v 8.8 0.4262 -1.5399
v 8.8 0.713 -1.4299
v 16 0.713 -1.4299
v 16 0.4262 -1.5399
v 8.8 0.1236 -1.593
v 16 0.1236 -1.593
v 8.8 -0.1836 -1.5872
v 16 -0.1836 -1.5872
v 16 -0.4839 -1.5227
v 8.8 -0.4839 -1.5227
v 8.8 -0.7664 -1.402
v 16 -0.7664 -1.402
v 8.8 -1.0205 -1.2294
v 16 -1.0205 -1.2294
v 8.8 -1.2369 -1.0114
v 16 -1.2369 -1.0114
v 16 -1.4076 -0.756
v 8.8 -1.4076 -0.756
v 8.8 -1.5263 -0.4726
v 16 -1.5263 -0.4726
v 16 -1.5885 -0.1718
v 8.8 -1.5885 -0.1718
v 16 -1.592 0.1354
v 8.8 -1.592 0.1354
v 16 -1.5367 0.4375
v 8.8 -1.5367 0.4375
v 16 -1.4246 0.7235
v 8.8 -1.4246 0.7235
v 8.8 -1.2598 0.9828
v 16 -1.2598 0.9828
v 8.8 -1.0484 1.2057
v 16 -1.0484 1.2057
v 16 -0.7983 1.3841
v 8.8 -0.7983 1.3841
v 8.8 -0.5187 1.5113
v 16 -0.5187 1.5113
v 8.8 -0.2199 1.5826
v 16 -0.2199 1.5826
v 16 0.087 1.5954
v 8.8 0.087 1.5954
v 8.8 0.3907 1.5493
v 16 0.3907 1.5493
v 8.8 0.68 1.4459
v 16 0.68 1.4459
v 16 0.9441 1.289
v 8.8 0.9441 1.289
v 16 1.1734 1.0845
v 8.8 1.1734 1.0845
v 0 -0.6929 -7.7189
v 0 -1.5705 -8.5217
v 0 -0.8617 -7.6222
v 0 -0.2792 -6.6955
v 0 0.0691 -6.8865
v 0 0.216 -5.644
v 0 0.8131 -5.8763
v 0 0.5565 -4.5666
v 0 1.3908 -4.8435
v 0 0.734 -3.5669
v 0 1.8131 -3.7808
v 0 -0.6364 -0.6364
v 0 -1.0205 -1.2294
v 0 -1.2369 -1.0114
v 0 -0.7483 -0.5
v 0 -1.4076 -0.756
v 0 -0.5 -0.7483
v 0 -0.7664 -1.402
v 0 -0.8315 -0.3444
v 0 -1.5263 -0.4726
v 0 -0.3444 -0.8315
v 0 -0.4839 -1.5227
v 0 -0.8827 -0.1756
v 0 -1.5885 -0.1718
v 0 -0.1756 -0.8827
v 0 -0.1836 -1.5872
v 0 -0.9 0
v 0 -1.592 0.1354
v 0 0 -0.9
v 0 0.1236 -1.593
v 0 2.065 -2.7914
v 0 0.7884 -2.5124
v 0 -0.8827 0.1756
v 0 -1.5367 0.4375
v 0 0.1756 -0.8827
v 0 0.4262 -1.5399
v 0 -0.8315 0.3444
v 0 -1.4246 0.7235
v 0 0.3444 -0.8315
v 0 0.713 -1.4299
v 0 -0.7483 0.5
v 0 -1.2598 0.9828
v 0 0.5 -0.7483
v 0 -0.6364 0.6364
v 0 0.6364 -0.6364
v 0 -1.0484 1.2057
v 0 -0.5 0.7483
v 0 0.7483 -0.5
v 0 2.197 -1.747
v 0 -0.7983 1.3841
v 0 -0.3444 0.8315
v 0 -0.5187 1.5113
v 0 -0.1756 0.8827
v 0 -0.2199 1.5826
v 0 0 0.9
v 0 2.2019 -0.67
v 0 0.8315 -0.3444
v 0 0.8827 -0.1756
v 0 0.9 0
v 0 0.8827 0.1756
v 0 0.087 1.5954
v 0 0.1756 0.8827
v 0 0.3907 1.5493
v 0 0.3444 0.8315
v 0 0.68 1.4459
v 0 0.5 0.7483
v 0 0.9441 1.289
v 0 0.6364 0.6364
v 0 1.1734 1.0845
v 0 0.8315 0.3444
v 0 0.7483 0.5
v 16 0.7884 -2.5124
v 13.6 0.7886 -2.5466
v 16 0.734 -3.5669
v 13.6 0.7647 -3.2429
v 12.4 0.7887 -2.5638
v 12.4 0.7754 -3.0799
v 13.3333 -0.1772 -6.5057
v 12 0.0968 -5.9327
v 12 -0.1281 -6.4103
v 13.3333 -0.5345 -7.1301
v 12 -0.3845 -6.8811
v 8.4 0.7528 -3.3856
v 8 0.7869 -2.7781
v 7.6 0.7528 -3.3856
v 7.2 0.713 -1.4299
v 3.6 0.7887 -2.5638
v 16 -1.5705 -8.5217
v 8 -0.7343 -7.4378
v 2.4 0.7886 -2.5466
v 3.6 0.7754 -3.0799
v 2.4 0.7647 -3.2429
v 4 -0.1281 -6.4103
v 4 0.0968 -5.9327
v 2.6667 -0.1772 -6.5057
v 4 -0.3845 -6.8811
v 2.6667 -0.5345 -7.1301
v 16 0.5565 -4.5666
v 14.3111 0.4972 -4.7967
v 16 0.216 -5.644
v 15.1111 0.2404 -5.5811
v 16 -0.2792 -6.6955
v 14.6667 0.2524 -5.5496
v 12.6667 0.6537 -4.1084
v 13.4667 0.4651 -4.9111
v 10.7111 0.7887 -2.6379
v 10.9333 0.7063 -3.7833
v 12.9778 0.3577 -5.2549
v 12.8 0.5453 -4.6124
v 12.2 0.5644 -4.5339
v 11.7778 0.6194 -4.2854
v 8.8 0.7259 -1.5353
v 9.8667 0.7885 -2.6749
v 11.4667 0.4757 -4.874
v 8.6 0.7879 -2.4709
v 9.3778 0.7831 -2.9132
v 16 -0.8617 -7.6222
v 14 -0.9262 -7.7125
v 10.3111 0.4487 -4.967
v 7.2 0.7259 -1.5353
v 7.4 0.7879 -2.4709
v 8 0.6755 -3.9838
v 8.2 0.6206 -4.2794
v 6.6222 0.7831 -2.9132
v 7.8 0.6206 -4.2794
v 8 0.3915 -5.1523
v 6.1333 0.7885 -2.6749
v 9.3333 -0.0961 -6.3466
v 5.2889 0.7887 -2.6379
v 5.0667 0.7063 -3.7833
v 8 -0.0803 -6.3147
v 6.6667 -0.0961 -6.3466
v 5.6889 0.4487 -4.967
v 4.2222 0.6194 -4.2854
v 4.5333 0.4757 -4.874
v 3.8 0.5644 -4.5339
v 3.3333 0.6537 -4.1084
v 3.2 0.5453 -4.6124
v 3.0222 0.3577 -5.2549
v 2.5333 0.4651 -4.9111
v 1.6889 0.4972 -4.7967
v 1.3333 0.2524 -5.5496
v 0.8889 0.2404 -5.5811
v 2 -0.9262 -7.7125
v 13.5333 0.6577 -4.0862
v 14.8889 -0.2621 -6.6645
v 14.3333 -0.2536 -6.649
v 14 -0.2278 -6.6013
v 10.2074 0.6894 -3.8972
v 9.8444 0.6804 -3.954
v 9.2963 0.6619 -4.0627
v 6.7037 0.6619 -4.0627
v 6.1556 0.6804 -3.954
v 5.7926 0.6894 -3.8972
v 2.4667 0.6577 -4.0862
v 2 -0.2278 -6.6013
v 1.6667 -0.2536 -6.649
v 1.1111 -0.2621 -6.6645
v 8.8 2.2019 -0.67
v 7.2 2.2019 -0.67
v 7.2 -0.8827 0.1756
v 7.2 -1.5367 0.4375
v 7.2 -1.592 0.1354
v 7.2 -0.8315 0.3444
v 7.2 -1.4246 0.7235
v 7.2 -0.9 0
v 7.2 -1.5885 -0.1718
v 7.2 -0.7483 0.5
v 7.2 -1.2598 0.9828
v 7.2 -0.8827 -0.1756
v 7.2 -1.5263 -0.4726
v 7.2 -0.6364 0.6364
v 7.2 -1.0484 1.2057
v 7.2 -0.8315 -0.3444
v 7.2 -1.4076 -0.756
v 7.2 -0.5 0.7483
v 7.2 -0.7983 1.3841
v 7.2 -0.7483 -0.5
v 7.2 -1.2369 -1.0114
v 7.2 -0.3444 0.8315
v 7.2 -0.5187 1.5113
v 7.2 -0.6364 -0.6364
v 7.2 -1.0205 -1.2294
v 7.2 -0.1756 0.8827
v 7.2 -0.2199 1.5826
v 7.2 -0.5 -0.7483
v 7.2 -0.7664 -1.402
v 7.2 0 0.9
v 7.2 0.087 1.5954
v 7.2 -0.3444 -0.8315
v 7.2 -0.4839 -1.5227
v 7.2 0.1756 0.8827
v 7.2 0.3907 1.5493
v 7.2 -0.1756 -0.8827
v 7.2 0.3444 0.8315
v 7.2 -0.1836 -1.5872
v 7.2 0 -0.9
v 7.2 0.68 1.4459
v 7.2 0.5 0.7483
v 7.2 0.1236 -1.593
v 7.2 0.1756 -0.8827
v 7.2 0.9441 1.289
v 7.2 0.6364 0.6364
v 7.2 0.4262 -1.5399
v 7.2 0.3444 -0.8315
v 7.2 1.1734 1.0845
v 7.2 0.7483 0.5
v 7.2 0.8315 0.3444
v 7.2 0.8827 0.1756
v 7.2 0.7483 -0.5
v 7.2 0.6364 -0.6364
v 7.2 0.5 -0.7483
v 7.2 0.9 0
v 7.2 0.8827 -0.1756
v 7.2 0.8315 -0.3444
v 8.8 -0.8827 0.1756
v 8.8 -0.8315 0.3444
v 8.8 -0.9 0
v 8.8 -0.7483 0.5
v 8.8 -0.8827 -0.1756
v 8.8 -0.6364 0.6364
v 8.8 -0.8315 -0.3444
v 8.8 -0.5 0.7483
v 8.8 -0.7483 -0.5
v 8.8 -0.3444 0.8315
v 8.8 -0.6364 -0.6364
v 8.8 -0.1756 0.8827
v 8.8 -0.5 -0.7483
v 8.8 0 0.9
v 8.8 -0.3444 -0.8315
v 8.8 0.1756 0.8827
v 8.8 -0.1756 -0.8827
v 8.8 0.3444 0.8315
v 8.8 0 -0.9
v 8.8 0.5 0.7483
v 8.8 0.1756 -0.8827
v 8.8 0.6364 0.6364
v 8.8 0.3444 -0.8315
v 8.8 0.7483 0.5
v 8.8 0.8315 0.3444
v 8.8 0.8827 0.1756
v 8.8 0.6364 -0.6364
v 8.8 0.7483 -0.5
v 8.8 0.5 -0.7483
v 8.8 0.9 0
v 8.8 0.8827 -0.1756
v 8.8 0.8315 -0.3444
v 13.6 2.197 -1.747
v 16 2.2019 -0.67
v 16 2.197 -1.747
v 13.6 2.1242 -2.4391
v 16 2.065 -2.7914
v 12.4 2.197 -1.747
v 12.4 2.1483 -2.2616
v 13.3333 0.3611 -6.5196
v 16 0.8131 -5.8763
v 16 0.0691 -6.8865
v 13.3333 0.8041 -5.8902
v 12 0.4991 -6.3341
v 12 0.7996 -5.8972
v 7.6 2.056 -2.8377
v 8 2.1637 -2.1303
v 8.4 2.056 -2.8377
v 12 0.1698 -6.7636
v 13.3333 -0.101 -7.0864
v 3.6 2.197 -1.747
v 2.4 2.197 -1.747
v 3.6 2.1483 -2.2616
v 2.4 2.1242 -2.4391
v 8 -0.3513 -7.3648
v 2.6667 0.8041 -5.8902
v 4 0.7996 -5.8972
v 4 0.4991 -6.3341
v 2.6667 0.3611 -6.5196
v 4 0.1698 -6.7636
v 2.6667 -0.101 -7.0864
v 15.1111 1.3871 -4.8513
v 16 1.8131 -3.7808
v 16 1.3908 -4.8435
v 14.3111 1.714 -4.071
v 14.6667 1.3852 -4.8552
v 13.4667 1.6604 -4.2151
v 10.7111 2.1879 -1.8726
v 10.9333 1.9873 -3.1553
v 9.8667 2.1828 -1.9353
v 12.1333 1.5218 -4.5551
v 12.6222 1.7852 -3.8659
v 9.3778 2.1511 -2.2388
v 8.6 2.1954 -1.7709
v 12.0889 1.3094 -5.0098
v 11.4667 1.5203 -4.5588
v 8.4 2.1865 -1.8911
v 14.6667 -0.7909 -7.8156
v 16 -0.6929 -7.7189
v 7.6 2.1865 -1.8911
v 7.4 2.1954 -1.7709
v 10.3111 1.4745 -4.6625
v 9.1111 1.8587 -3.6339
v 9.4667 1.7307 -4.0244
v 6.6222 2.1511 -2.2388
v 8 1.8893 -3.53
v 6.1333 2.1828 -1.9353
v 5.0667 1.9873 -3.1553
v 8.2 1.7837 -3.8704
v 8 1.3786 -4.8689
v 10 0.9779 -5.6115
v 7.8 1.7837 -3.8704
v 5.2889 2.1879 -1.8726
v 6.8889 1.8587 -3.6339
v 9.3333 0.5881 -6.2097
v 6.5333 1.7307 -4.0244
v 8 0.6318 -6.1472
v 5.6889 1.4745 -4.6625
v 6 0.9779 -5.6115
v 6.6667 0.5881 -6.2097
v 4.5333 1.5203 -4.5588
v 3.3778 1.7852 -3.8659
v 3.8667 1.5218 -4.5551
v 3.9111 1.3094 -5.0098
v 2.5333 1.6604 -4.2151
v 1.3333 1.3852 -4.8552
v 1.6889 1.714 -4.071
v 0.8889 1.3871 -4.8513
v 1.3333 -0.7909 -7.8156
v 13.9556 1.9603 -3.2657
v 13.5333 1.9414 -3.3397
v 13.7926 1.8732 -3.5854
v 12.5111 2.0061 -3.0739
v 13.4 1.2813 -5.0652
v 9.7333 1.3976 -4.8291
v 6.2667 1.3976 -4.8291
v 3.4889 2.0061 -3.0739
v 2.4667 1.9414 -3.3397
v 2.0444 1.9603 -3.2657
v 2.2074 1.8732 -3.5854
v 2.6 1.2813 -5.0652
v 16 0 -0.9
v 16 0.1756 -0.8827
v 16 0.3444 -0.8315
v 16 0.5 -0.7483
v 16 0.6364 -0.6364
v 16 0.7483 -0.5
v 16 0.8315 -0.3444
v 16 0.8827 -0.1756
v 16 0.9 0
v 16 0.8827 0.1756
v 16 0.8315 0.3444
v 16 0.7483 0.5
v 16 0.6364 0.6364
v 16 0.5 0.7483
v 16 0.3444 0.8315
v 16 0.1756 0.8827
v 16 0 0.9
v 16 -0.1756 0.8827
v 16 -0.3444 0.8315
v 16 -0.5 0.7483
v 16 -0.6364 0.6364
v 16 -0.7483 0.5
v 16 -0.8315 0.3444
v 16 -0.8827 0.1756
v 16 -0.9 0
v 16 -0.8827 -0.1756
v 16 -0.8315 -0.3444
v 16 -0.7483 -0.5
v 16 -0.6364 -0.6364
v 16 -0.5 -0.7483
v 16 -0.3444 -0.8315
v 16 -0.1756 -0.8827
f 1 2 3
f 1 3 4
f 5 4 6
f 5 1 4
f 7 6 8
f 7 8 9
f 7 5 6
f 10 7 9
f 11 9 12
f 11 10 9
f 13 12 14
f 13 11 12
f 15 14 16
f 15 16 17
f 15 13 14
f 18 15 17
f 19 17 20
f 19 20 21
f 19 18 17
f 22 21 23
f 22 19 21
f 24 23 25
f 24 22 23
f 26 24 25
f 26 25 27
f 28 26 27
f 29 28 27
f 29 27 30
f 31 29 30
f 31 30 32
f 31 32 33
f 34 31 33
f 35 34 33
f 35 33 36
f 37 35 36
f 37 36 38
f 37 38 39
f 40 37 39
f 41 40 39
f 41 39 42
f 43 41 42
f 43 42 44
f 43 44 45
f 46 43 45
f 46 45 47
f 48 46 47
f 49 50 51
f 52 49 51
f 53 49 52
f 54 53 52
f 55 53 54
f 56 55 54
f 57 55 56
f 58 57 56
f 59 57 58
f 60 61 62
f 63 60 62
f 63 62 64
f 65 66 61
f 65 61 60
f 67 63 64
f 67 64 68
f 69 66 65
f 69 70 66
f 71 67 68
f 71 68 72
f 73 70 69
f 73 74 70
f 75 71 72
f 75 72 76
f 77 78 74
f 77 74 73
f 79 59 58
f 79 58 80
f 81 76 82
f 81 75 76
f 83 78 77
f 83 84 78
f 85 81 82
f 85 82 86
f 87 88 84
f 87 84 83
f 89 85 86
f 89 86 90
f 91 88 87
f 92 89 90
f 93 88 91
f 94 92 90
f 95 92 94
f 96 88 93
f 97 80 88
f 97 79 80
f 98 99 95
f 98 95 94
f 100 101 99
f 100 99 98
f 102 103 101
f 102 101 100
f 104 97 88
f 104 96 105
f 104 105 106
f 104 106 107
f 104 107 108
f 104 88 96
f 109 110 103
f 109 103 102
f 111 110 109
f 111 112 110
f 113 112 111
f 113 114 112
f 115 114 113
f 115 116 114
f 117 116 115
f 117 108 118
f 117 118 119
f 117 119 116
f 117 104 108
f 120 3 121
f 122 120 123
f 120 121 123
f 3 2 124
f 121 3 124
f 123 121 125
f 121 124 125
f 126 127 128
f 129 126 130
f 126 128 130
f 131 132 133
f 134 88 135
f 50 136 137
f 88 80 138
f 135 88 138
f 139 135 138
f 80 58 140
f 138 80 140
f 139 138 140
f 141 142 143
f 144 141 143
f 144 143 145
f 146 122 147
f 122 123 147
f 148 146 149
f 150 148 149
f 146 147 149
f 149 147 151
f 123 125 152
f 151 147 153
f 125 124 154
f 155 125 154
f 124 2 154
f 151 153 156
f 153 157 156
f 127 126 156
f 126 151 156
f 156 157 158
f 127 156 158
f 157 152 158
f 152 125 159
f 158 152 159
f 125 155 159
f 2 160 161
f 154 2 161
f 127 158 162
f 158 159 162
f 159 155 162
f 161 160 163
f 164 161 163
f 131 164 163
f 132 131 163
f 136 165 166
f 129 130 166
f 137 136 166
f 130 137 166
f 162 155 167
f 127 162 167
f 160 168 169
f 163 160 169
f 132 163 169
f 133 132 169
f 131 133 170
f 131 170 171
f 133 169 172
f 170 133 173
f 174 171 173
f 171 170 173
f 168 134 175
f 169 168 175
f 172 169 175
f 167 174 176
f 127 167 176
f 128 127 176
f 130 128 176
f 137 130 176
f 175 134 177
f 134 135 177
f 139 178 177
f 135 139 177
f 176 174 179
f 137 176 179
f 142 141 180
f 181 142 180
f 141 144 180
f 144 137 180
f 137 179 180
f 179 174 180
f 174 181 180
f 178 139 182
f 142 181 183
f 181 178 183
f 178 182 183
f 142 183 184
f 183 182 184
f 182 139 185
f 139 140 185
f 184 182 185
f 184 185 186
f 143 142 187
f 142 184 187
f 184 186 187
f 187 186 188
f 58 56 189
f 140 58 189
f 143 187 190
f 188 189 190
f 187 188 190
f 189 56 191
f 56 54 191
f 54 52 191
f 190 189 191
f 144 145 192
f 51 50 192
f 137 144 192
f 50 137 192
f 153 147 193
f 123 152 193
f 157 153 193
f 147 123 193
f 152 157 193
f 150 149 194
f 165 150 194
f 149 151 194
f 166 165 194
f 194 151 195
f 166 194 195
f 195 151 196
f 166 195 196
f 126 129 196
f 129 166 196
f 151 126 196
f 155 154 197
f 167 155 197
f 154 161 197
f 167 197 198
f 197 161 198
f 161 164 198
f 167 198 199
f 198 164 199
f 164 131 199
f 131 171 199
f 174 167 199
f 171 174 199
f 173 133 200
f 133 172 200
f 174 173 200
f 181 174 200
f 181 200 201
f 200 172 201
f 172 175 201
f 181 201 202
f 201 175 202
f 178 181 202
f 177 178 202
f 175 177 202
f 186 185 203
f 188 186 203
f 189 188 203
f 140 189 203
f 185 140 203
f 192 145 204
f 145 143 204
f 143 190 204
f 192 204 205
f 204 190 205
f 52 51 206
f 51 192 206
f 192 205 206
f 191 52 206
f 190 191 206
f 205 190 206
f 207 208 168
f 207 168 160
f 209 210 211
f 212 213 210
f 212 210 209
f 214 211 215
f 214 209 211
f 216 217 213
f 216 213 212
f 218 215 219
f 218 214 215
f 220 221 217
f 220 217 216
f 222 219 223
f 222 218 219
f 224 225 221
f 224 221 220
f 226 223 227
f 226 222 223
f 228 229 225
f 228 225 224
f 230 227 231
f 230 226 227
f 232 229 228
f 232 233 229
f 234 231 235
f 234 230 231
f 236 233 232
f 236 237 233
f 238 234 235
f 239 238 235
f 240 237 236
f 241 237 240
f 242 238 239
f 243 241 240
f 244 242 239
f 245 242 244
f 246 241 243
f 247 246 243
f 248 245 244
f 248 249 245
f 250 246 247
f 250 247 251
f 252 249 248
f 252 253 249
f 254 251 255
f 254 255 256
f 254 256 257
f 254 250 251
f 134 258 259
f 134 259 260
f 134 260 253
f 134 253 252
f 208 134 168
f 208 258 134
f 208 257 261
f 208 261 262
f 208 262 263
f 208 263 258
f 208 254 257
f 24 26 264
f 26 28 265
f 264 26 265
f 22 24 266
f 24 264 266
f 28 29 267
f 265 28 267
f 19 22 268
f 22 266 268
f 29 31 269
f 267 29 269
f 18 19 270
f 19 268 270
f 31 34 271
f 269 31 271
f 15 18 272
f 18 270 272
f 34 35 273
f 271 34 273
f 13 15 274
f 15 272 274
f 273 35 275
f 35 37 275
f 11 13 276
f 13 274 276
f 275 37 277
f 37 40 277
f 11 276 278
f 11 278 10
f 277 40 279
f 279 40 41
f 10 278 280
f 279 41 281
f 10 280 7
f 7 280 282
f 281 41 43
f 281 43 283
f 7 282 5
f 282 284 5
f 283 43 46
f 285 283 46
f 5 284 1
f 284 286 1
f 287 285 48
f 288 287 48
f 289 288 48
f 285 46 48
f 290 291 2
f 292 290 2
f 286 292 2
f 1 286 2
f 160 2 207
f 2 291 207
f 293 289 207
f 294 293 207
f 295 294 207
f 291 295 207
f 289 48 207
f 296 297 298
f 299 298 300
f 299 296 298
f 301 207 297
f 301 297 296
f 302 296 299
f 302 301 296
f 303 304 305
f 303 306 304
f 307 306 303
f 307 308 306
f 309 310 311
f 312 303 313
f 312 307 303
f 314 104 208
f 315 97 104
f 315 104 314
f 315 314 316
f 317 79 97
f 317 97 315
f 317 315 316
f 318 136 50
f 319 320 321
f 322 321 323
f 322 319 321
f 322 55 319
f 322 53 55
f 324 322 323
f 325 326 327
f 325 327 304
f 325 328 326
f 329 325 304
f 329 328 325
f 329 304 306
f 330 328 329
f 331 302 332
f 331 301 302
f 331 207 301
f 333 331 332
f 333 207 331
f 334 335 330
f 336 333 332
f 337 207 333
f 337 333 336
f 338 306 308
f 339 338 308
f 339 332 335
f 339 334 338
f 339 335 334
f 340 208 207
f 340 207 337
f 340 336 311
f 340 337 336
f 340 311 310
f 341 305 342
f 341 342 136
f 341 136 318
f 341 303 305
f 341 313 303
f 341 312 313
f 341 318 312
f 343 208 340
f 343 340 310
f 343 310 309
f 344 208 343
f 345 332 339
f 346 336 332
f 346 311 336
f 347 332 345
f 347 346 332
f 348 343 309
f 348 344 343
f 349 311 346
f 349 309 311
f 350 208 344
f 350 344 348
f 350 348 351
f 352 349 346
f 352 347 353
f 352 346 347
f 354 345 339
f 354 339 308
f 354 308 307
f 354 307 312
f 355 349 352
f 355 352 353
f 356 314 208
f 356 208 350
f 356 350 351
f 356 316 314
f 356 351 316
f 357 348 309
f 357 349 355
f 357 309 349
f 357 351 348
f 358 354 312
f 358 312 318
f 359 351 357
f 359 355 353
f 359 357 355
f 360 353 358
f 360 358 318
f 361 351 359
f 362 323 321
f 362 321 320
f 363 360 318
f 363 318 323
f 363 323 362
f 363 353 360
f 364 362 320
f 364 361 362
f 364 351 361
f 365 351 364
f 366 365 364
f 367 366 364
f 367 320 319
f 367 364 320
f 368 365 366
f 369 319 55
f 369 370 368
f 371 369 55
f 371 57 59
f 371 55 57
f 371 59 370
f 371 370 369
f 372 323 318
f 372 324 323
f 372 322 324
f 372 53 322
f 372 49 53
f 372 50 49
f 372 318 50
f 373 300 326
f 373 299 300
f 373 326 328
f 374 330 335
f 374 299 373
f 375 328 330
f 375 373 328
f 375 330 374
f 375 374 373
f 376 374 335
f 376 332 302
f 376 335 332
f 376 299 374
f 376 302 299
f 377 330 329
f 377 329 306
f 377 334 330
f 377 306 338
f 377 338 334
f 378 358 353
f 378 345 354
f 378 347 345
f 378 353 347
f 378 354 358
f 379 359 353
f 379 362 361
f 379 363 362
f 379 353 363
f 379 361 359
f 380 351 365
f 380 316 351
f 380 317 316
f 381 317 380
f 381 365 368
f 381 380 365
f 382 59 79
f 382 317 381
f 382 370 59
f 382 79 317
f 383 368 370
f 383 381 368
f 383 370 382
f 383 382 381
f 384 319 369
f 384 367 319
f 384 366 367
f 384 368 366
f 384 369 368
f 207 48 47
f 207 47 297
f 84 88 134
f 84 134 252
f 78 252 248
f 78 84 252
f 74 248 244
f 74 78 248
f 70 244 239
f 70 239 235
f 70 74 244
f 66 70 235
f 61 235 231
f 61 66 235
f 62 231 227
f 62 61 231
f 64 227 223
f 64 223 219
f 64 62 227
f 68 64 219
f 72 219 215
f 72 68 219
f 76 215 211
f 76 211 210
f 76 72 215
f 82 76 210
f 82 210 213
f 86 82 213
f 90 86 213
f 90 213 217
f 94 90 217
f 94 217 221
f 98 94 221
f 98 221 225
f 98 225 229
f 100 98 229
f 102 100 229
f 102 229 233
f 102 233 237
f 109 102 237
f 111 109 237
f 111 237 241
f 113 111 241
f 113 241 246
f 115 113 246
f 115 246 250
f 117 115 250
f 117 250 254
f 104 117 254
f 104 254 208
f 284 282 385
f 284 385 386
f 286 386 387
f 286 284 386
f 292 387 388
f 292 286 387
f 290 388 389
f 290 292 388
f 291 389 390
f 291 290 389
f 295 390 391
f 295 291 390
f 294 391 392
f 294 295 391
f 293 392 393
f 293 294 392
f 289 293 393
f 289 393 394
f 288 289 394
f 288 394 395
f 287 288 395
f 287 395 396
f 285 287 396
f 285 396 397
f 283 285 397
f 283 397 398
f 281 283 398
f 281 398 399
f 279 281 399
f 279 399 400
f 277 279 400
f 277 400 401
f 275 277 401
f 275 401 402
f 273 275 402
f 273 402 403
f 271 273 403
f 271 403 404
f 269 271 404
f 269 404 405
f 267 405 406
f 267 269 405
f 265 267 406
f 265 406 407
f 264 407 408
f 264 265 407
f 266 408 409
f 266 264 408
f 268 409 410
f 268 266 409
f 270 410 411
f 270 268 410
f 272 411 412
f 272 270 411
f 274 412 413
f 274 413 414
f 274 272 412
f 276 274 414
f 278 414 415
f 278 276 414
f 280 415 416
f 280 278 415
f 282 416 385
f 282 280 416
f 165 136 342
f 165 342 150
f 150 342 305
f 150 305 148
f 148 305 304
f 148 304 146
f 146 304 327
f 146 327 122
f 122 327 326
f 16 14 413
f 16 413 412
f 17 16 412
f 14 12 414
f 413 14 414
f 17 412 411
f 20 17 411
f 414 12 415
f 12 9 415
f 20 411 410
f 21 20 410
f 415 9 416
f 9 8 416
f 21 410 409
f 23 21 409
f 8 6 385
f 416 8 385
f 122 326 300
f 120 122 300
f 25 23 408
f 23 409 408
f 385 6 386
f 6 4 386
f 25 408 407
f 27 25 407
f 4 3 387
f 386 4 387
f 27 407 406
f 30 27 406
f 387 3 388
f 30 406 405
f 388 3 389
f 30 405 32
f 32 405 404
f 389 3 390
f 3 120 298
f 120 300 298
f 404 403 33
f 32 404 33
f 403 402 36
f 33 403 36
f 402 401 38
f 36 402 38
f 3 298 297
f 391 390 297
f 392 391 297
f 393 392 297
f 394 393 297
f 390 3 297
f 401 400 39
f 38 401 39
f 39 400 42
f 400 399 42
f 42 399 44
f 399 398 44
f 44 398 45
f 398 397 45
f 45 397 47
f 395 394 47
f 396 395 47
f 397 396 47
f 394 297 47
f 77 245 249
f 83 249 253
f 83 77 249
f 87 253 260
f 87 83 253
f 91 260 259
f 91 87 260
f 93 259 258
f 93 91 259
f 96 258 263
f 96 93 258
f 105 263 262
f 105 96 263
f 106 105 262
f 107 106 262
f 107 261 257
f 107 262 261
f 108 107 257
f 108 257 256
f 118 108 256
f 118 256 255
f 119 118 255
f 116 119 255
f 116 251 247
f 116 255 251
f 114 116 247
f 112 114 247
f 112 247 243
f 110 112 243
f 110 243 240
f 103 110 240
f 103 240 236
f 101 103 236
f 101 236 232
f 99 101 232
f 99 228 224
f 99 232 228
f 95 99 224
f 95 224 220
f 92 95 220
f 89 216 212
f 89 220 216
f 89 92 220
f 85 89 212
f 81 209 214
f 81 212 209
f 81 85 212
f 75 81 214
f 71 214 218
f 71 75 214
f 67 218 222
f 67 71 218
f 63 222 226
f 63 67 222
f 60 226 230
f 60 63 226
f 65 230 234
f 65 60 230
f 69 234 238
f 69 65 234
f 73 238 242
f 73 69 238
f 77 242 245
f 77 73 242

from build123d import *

# Parameters (mm, degrees)
SKETCH1_R           = 0.9
BOSS_EXTRUDE1_DEPTH = 16
SKETCH2_W           = 1.6
SKETCH2_H           = 4.200659695
CUT_EXTRUDE1_DEPTH  = 10


with BuildPart() as part:
    # Sketch1 → Boss-Extrude1 (new body)
    with BuildSketch(Plane(origin=(0, 0, 0), x_dir=(0, 0, -1), z_dir=(1, 0, 0))):
        with BuildLine():
            Line((-1.084501086, 1.173366689), (0.669981536, 2.201916273))
            add(Edge.make_bspline(
                [(0.669981536, 2.201916273), (5.142012003, 2.441554719), (8.521732168, -1.570541081)],
                knots=[0, 0, 0, 1, 1, 1], degree=2))
            add(Edge.make_bspline(
                [(1.429892444, 0.712979376), (5.328809075, 1.211697848), (8.521732168, -1.570541081)],
                knots=[0, 0, 0, 1, 1, 1], degree=2))
            ThreePointArc((1.429892444, 0.712979376), (-0.287772336, -1.571661247), (-1.084501086, 1.173366689))
        make_face()
        Circle(SKETCH1_R, mode=Mode.SUBTRACT)
    extrude(amount=BOSS_EXTRUDE1_DEPTH)

    # Sketch2 → Cut-Extrude1 (cut)
    with BuildSketch(Plane(origin=(0, 1.346412624, 0.789322234), x_dir=(1, 0, 0), z_dir=(0, 0.8626851476678137, 0.5057413726336444))):
        with Locations((8, -0.408746569)):
            Rectangle(SKETCH2_W, SKETCH2_H)
    extrude(amount=-CUT_EXTRUDE1_DEPTH, mode=Mode.SUBTRACT)


solid = part.part
